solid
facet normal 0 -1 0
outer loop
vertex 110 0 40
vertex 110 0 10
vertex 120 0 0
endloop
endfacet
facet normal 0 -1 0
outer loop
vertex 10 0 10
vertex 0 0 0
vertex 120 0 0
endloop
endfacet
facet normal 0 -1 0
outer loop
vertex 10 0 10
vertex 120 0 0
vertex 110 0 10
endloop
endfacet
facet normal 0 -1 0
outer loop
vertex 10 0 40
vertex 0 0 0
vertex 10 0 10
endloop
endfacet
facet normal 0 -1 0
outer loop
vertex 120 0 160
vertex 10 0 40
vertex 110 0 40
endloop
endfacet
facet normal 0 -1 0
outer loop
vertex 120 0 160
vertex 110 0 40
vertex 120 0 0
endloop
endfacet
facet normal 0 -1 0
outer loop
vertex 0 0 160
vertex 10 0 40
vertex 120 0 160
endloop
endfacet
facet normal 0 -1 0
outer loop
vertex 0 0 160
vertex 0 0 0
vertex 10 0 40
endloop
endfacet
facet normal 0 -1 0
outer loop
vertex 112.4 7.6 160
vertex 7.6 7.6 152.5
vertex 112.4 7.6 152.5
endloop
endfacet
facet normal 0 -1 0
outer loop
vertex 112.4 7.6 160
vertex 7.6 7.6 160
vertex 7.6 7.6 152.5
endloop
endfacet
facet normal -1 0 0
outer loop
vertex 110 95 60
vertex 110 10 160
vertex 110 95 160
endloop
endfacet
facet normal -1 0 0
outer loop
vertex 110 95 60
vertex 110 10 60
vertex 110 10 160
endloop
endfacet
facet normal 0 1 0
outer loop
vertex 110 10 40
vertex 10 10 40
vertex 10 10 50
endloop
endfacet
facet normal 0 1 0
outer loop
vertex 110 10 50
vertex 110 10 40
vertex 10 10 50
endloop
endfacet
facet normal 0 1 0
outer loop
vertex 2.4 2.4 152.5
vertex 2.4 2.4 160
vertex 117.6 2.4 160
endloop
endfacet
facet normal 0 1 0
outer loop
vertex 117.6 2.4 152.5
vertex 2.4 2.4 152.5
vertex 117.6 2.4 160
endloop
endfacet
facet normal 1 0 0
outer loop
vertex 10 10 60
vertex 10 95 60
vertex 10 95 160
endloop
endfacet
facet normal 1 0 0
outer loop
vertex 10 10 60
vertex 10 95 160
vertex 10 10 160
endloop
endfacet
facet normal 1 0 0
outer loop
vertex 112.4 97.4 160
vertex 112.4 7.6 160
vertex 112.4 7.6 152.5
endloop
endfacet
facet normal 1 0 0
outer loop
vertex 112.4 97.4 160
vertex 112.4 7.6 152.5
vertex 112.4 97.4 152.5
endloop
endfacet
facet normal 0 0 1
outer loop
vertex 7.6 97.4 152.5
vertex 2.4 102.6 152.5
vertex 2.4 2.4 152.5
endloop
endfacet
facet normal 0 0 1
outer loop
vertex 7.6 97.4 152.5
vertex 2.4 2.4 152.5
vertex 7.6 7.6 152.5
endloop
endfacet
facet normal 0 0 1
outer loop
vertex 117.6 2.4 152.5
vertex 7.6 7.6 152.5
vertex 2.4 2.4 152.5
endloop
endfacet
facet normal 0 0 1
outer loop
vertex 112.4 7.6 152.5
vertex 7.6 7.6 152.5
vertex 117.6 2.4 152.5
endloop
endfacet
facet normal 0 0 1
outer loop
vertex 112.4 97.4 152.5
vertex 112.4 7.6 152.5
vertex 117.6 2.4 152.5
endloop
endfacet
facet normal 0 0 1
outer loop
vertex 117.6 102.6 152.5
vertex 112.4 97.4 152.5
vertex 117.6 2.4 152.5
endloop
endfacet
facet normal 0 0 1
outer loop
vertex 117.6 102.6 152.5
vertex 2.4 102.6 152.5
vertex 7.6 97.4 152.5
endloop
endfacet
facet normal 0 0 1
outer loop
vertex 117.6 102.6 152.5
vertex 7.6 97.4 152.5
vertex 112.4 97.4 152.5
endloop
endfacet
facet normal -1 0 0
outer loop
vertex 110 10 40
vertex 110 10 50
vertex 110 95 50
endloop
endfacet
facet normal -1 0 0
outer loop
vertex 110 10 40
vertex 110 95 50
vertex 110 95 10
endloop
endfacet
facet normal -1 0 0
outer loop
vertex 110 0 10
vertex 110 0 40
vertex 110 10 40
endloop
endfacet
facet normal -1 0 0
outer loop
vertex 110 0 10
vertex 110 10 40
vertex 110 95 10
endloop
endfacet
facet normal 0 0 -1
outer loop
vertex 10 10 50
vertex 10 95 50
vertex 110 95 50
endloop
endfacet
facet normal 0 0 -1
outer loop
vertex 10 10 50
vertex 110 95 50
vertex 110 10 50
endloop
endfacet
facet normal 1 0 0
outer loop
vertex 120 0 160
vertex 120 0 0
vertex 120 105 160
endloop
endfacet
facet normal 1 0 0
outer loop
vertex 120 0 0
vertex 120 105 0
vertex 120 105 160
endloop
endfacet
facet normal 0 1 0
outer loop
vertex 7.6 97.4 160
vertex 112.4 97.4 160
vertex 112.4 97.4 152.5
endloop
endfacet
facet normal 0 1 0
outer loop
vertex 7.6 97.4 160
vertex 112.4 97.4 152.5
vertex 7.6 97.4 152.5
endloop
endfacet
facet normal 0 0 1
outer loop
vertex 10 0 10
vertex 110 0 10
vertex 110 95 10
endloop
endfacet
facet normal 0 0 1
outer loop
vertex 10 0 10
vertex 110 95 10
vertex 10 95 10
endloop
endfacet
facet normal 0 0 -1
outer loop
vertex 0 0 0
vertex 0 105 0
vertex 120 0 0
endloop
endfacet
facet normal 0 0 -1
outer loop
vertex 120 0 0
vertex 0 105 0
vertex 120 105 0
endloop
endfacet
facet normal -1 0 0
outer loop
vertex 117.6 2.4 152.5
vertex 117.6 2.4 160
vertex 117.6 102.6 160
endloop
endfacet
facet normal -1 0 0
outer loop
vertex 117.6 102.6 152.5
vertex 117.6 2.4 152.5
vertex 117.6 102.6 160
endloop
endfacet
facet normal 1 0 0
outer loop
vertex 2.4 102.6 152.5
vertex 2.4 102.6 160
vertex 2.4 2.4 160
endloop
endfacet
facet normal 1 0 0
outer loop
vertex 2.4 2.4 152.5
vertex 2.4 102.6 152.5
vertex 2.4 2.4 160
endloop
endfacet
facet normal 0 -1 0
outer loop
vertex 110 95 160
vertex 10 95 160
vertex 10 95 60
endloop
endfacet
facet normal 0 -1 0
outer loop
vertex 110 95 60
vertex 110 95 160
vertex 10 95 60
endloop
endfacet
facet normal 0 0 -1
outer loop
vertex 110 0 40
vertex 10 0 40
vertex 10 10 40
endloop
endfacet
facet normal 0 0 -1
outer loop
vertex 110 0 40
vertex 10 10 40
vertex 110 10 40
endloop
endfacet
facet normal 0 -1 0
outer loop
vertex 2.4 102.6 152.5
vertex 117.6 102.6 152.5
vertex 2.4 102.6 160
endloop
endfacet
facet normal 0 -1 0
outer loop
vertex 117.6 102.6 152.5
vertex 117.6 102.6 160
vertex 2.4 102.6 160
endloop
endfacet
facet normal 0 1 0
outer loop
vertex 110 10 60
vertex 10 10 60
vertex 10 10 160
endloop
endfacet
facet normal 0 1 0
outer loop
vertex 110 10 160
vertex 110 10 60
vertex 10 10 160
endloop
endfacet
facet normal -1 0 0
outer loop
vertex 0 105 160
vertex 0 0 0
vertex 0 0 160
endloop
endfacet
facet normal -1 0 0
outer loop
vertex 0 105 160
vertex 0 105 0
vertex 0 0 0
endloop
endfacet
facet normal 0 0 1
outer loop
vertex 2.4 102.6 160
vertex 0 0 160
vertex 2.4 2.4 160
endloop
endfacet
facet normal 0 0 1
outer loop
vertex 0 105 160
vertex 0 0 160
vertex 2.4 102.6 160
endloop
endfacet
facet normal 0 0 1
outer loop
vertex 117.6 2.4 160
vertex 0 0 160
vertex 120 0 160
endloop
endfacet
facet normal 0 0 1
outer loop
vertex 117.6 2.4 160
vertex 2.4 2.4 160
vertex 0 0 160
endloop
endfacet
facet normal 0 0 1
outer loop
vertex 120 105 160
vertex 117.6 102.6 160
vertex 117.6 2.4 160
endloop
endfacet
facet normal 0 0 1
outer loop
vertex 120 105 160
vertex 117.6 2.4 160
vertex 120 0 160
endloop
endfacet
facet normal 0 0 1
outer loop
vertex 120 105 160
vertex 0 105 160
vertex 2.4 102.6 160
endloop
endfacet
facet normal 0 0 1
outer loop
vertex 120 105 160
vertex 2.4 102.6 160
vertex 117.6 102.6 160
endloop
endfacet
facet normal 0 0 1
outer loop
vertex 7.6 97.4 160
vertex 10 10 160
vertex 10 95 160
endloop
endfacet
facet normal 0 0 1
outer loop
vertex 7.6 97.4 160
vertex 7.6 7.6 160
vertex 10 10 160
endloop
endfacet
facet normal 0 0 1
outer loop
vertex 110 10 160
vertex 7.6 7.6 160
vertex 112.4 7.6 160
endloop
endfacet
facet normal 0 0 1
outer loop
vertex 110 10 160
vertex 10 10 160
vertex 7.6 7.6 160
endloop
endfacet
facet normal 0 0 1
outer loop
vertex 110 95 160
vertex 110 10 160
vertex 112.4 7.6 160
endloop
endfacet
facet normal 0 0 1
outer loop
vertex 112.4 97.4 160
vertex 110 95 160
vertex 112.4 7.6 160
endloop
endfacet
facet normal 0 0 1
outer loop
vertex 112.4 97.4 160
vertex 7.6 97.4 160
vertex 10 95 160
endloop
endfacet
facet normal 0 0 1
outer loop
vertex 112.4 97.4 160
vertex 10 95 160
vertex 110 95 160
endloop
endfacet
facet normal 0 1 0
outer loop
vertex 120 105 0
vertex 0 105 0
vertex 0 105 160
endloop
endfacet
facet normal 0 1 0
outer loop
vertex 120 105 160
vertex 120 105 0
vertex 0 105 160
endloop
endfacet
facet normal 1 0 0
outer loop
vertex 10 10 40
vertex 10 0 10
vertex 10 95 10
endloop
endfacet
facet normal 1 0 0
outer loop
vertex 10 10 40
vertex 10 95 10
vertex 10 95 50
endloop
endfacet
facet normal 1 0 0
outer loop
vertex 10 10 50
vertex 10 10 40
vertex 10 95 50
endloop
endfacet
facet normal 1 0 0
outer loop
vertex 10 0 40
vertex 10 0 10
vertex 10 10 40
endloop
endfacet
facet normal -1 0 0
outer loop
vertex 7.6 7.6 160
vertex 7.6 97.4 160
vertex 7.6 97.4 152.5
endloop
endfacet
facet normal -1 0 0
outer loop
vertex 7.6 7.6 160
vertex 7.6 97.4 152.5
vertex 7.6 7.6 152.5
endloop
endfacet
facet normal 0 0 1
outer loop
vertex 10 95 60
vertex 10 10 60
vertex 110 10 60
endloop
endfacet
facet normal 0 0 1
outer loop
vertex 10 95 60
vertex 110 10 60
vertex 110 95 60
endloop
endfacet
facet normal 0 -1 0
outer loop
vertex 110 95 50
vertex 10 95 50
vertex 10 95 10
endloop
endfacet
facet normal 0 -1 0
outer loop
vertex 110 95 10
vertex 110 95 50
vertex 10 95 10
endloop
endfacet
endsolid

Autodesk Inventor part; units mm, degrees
ref_plane "YZ Plane" through (0, 0, 0) normal (1, 0, 0) x (0, 1, 0)
ref_plane "XZ Plane" through (0, 0, 0) normal (0, 1, 0) x (-1, 0, 0)
ref_plane "XY Plane" through (0, 0, 0) normal (0, 0, 1) x (1, 0, 0)
sketch "Skizze1" plane through (0, 0, 0) normal (0, 0, 1) x (1, 0, 0)
  line L0 (-24, 0) -> (144, 0) projected
  line L1 (0, -21) -> (0, 126) projected
  line L2 (0, 0) -> (120, 0)
  line L3 (120, 0) -> (120, 105)
  line L4 (120, 105) -> (0, 105)
  line L5 (0, 105) -> (0, 0)
  line L6 (10, 10) -> (110, 10)
  line L7 (110, 10) -> (110, 95)
  line L8 (110, 95) -> (10, 95)
  line L9 (10, 95) -> (10, 10)
  dimension "d0" = 85
  dimension "d1" = 100
  dimension "d2" = 10
  dimension "d3" = 10
  dimension "d4" = 10
  dimension "d5" = 10
extrude "Extrusion1" add sketch "Skizze1" along normal blind 160
sketch "Skizze2" plane through (0, 0, 0) normal (0, 0, -1) x (-1, 0, 0)
  line L0 (-120, 0) -> (-120, 105) projected
  line L1 (-120, 105) -> (0, 105) projected
  line L2 (-120, 0) -> (0, 0)
  line L3 (0, 0) -> (0, 105)
  line L4 (0, 105) -> (-120, 105)
  line L5 (-120, 105) -> (-120, 0)
  point P0 (0, 0)
extrude "Extrusion2" add sketch "Skizze2" against normal blind 10
sketch "Skizze3" plane through (0, 0, 160) normal (-1, 0, 0) x (0, 0, 1)
  line L0 (-120, 95) -> (-150, 95)
  line L1 (-150, 95) -> (-150, 10)
  line L2 (-150, 10) -> (-120, 10)
  line L3 (-120, 10) -> (-120, 95)
  line L4 (-160, 105) -> (-160, 0) projected
  line L5 (-160, 0) -> (0, 0) projected
  line L6 (-160, 105) -> (0, 105) projected
  dimension "d10" = 10
  dimension "d11" = 10
  dimension "d12" = 10
  dimension "d13" = 30
extrude "Extrusion3" cut sketch "Skizze3" against normal blind 10
sketch "Skizze4" plane through (0, 0, 160) normal (-1, 0, 0) x (0, 0, 1)
  line L0 (-160, 105) -> (0, 105) projected
  line L1 (-160, 0) -> (0, 0) projected
  line L2 (-100, 105) -> (-110, 105)
  line L3 (-110, 105) -> (-110, 0)
  line L4 (-110, 0) -> (-100, 0)
  line L5 (-100, 0) -> (-100, 105)
  line L6 (-120, 95) -> (-120, 10) projected
  dimension "d16" = 10
  dimension "d17" = 10
extrude "Extrusion4" add sketch "Skizze4" against normal blind 120
sketch "Skizze5" plane through (0, 0, 160) normal (0, 0, 1) x (1, 0, 0)
  line L0 (117.6, 102.6) -> (2.4, 102.6)
  line L1 (2.4, 102.6) -> (2.4, 2.4)
  line L2 (2.4, 2.4) -> (117.6, 2.4)
  line L3 (117.6, 2.4) -> (117.6, 102.6)
  line L4 (112.4, 97.4) -> (7.6, 97.4)
  line L5 (7.6, 97.4) -> (7.6, 7.6)
  line L6 (7.6, 7.6) -> (112.4, 7.6)
  line L7 (112.4, 7.6) -> (112.4, 97.4)
  line L8 (120, 0) -> (120, 105) projected
  line L9 (0, 0) -> (120, 0) projected
  line L10 (110, 95) -> (110, 10) projected
  line L11 (110, 10) -> (10, 10) projected
  line L12 (120, 105) -> (0, 105) projected
  line L13 (10, 95) -> (110, 95) projected
  line L14 (10, 10) -> (10, 95) projected
  line L15 (0, 105) -> (0, 0) projected
  dimension "d20" = 2.4
  dimension "d21" = 2.4
  dimension "d22" = 2.4
  dimension "d23" = 2.4
  dimension "d24" = 2.4
  dimension "d25" = 2.4
  dimension "d26" = 2.4
  dimension "d27" = 2.4
extrude "Extrusion5" cut sketch "Skizze5" against normal blind 7.5 contours L3 L2 L1 L0
sketch "Skizze6" plane through (0, 0, 160) normal (-1, 0, 0) x (0, 0, 1)
  line L0 (-120, 10) -> (-120, 95) projected
  line L1 (-150, 95) -> (-150, 10) projected
  line L2 (-120, 95) -> (-150, 95)
  line L3 (-150, 95) -> (-150, 10)
  line L4 (-150, 10) -> (-120, 10)
  line L5 (-120, 10) -> (-120, 95)
  point P0 (-160, 0)
extrude "Extrusion6" add sketch "Skizze6" against normal blind 10
sketch "Skizze7" plane through (0, 0, 160) normal (0, -1, 0) x (1, 0, 0)
  line L0 (10, -120) -> (110, -120)
  line L1 (110, -120) -> (110, -150)
  line L2 (110, -150) -> (10, -150)
  line L3 (10, -150) -> (10, -120)
  line L4 (0, -160) -> (120, -160) projected
  line L5 (120, -160) -> (120, 0) projected
  line L6 (0, -160) -> (0, 0) projected
  dimension "d32" = 10
  dimension "d33" = 10
  dimension "d34" = 10
  dimension "d35" = 30
extrude "Extrusion7" cut sketch "Skizze7" against normal blind 10
properties part number "Eierkocher_final" material "Acetalharz, Schwarz"
